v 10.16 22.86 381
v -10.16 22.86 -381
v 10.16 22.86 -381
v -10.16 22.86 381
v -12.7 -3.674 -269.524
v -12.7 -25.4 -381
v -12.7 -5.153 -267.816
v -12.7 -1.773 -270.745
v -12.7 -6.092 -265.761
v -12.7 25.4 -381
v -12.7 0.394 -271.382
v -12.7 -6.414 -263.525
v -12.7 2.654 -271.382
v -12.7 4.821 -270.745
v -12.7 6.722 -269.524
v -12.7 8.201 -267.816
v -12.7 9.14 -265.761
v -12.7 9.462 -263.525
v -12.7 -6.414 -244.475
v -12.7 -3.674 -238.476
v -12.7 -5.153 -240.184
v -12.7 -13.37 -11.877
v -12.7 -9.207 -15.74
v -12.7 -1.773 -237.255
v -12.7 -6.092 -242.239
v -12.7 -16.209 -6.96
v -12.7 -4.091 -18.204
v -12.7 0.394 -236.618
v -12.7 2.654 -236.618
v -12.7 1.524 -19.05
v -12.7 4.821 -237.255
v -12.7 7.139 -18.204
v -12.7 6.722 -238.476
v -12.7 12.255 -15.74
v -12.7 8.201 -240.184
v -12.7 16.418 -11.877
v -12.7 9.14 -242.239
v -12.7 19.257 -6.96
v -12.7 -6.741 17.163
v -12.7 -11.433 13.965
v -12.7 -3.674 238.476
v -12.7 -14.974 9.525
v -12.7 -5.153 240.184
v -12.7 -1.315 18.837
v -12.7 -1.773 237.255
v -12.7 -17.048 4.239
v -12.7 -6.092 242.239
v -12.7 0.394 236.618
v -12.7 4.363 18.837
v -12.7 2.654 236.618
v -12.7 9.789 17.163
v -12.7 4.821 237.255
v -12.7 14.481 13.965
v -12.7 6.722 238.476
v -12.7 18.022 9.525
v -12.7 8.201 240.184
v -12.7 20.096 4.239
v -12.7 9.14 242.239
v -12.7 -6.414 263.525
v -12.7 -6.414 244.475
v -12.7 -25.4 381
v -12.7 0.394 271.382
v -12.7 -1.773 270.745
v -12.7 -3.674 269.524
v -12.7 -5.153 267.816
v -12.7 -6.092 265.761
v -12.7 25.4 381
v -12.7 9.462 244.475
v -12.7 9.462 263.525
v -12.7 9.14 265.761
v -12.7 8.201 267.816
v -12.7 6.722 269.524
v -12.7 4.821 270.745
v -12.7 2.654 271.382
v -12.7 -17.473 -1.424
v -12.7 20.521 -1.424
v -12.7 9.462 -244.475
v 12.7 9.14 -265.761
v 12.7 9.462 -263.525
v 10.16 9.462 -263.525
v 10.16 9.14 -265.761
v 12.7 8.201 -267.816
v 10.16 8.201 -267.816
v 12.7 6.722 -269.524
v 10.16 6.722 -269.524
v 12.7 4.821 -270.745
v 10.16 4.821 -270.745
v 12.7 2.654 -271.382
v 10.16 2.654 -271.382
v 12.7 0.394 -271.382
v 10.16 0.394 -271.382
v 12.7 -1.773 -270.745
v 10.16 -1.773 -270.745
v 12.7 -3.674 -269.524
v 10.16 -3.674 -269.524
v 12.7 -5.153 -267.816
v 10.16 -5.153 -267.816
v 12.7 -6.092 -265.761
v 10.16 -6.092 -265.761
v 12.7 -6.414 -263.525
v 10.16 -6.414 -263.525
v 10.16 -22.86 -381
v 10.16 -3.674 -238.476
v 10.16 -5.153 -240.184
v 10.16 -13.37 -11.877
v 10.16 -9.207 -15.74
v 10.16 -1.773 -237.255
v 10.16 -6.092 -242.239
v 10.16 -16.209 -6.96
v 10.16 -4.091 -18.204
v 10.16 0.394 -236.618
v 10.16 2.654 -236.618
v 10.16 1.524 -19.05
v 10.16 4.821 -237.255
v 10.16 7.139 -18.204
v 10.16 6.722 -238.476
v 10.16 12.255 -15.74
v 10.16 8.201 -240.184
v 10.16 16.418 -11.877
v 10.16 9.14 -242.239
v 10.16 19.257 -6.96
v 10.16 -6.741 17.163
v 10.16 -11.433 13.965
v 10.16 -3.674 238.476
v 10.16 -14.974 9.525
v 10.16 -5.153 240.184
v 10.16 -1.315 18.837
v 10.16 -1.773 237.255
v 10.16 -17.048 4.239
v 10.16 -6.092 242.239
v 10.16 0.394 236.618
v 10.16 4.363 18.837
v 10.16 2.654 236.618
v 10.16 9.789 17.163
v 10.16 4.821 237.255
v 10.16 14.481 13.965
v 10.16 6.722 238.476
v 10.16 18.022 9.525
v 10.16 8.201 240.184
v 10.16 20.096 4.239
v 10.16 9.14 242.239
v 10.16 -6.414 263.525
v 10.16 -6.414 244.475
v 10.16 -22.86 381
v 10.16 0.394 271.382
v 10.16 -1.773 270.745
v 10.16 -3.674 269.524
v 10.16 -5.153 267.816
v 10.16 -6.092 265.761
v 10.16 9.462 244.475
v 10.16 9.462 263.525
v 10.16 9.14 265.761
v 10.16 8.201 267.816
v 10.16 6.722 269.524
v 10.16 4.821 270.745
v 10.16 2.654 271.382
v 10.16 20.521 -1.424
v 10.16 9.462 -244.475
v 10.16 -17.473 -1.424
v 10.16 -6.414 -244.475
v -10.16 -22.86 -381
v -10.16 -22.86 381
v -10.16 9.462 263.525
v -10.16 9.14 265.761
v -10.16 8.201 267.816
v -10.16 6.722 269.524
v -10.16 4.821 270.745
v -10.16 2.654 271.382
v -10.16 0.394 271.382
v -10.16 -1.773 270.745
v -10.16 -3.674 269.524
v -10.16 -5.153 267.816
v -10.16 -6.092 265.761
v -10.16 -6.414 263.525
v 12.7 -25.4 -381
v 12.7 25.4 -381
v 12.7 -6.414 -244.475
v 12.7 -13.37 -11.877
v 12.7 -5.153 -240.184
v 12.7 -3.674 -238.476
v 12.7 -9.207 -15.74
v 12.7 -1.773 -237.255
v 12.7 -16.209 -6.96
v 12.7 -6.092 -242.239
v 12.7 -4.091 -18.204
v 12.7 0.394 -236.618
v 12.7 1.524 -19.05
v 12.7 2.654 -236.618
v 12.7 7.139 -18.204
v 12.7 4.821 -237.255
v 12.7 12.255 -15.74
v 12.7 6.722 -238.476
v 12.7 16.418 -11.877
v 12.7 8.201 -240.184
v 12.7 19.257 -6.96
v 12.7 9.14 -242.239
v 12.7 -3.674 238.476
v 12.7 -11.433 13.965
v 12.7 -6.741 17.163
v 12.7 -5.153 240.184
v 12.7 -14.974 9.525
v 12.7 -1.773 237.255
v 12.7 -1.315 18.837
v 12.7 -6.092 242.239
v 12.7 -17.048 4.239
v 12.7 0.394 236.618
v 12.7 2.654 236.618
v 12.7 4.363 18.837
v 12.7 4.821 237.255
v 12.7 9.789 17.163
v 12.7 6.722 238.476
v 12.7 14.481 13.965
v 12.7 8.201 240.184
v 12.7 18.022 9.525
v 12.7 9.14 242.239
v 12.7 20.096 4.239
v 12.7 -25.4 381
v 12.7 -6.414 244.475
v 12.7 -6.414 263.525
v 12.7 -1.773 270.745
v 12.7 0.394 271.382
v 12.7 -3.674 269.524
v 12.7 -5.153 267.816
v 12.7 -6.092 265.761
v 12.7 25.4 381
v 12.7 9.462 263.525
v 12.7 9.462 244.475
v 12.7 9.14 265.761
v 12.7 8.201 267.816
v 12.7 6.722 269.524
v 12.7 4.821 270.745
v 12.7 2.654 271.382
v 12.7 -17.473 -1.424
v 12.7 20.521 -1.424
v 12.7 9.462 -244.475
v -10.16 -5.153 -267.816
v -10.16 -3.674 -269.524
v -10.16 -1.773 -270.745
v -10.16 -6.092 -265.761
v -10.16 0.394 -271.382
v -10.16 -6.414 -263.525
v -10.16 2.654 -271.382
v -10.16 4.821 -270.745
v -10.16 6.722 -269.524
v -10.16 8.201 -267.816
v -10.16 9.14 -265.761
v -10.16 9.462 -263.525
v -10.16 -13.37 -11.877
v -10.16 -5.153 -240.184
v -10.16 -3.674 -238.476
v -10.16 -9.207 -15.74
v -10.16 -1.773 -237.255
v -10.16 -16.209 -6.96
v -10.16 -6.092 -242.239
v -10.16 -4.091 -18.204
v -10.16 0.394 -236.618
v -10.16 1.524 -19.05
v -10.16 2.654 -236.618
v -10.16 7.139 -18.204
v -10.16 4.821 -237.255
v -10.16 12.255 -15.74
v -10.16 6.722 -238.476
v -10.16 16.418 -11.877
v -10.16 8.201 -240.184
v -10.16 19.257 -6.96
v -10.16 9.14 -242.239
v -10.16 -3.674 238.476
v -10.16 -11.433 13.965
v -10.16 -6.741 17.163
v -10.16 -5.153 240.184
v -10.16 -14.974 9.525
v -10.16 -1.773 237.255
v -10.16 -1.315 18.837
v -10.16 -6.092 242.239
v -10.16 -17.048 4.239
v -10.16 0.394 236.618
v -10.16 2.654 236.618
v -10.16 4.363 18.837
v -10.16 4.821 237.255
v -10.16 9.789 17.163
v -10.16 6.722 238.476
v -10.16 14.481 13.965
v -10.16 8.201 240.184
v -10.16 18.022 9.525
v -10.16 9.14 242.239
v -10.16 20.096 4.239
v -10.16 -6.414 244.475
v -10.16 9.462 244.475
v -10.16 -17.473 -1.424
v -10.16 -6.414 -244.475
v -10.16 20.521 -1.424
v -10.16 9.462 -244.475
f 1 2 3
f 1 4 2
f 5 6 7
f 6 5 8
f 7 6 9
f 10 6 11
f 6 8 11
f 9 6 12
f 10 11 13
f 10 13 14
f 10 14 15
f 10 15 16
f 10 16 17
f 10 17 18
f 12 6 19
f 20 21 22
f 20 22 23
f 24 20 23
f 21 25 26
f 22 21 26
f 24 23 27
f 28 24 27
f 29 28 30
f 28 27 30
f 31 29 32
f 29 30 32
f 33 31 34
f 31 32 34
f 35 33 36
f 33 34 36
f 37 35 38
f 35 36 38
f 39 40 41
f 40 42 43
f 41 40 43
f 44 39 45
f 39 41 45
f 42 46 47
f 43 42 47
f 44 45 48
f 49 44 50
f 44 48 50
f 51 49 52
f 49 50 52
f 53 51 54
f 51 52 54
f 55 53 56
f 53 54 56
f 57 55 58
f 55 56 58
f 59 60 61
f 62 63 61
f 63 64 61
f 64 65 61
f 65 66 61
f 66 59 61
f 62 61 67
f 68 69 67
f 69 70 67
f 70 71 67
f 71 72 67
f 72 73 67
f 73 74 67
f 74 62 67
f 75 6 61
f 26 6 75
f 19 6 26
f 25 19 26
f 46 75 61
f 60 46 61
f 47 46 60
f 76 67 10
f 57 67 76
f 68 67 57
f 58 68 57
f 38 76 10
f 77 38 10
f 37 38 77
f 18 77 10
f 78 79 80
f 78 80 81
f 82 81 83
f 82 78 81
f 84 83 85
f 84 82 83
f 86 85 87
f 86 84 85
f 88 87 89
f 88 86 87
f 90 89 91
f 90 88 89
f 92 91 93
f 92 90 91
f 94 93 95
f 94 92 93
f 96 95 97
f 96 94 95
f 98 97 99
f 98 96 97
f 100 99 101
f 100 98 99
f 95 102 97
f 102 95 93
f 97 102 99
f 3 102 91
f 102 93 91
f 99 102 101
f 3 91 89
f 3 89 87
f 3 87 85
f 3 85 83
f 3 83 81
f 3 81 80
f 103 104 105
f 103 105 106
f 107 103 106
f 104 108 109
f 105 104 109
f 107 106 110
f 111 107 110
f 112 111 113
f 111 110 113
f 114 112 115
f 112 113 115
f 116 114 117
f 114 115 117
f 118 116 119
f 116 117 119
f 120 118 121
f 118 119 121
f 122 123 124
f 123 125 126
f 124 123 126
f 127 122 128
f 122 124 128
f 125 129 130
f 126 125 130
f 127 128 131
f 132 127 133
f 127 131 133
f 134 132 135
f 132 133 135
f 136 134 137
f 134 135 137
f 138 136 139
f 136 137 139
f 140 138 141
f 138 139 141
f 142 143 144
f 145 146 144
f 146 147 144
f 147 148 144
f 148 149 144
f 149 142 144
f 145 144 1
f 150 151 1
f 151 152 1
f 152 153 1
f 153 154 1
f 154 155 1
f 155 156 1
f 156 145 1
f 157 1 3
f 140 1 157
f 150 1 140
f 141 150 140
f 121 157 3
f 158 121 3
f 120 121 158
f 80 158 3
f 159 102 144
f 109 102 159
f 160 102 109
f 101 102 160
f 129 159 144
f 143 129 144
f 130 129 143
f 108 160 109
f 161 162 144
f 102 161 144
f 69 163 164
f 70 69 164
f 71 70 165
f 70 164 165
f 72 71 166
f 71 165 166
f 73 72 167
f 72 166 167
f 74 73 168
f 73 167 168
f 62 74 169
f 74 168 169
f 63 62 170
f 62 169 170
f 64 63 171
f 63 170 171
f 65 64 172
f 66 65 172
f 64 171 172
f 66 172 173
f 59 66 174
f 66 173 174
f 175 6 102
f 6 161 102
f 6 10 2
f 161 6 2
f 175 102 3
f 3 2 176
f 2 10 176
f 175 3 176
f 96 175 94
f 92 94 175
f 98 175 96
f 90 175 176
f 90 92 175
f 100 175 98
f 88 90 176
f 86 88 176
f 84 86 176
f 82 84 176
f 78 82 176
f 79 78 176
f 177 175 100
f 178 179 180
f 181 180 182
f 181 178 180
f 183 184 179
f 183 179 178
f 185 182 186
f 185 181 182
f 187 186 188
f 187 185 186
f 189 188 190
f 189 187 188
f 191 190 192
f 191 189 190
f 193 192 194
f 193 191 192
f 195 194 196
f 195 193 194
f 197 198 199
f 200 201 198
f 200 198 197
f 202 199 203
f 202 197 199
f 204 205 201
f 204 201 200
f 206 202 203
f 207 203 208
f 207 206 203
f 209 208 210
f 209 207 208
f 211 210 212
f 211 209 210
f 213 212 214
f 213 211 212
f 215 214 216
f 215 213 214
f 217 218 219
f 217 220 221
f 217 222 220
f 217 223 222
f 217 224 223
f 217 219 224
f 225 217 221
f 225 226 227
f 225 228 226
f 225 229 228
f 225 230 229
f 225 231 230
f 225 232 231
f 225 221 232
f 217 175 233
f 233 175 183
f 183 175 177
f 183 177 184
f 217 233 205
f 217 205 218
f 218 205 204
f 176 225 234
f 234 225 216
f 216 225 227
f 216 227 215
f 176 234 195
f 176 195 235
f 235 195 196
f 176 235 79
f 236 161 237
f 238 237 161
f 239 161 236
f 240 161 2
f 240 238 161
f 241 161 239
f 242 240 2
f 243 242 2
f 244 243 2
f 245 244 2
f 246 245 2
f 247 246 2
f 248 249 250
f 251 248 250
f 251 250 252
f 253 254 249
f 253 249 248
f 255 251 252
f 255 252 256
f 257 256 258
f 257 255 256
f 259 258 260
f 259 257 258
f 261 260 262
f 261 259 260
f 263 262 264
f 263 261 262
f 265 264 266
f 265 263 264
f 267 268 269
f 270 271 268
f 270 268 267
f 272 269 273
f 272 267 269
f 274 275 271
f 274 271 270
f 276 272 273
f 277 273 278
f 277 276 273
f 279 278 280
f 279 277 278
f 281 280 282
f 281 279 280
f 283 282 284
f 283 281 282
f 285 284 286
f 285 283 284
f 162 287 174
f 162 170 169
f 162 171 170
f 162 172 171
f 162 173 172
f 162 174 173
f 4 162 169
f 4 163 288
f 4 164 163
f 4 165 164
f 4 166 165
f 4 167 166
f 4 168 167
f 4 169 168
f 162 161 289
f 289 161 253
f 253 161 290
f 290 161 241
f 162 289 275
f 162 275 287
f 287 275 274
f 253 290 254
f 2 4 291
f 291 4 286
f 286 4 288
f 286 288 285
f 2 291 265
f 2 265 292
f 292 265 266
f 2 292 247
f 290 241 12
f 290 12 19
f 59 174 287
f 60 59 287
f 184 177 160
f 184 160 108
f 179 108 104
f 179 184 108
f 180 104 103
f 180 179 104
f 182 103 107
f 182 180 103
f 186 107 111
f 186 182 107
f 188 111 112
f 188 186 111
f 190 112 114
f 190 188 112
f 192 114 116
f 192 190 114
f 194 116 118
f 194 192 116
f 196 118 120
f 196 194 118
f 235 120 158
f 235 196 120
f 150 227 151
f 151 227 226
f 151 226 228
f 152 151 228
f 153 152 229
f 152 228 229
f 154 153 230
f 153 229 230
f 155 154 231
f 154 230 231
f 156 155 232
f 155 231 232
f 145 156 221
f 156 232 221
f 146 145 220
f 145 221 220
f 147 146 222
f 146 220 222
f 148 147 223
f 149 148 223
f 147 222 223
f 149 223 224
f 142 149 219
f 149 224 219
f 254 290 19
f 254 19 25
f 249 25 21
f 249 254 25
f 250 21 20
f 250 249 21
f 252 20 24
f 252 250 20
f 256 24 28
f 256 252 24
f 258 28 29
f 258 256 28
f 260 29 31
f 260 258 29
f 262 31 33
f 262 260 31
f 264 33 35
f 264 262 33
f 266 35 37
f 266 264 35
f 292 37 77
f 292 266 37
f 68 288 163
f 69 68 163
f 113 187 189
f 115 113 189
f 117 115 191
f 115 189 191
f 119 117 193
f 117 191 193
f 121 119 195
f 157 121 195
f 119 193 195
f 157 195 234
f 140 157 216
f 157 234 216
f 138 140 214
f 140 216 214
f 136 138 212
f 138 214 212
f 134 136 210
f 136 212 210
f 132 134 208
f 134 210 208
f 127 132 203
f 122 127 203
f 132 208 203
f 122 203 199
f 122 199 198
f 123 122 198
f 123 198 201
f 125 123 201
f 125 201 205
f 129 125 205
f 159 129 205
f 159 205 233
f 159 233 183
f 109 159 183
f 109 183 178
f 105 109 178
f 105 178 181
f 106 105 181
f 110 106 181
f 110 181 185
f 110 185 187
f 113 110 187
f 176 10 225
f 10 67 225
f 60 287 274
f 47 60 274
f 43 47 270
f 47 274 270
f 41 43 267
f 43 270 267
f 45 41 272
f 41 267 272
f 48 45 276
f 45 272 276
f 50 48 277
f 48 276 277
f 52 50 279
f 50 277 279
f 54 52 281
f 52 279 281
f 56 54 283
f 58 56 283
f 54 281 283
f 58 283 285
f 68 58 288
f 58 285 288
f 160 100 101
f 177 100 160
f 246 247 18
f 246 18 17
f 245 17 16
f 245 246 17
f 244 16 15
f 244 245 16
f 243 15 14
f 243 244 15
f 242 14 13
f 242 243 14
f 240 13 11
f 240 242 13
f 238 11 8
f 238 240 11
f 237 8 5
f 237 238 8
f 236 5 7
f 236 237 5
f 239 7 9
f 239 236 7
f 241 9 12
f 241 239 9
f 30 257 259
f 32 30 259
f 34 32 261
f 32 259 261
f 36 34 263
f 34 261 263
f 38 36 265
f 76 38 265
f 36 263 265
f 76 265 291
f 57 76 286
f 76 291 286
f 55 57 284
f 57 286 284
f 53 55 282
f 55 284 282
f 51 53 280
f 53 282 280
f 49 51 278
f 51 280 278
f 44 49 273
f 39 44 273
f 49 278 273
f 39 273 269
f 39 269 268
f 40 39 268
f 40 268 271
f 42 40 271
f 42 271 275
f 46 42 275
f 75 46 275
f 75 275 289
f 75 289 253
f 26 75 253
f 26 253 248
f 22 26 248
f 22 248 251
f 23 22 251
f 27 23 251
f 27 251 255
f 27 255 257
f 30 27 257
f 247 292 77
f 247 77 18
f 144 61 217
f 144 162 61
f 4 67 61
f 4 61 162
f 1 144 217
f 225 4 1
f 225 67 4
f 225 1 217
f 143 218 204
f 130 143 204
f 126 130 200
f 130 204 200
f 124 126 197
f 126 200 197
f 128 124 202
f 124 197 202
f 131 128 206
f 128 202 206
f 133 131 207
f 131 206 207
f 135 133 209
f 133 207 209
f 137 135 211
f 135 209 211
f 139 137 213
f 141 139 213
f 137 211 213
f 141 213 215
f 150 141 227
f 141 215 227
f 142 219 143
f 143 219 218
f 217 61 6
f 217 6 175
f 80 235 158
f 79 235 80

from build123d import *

# Parameters (mm, degrees)
SKETCH1_W           = 25.4
SKETCH1_H           = 50.8
SKETCH1_W_2         = 20.32
SKETCH1_H_2         = 45.72
EXTRUDE_THIN1_DEPTH = 381
SKETCH3_R           = 19.05
CUT_EXTRUDE1_DEPTH  = 383.689587002


with BuildPart() as part:
    # Sketch1 → Extrude-Thin1 (new, symmetric)
    with BuildSketch(Plane.XY):
        Rectangle(SKETCH1_W, SKETCH1_H)
        Rectangle(SKETCH1_W_2, SKETCH1_H_2, mode=Mode.SUBTRACT)
    extrude(amount=EXTRUDE_THIN1_DEPTH, both=True)

    # Sketch3 → Cut-Extrude1 (cut, through all)
    with BuildSketch(Plane(origin=(12.7, 0, 0), x_dir=(0, 0, -1), z_dir=(1, 0, 0))):
        with Locations((0, 1.524)):
            Circle(SKETCH3_R)
        with BuildLine():
            Line((244.475, 9.4615), (263.525, 9.4615))
            ThreePointArc((263.525, 9.4615), (271.4625, 1.524), (263.525, -6.4135))
            Line((263.525, -6.4135), (244.475, -6.4135))
            ThreePointArc((244.475, -6.4135), (236.5375, 1.524), (244.475, 9.4615))
        make_face()
        with BuildLine():
            Line((-244.475, 9.4615), (-263.525, 9.4615))
            ThreePointArc((-263.525, 9.4615), (-271.4625, 1.524), (-263.525, -6.4135))
            Line((-263.525, -6.4135), (-244.475, -6.4135))
            ThreePointArc((-244.475, -6.4135), (-236.5375, 1.524), (-244.475, 9.4615))
        make_face()
    extrude(amount=-CUT_EXTRUDE1_DEPTH, mode=Mode.SUBTRACT)


solid = part.part
